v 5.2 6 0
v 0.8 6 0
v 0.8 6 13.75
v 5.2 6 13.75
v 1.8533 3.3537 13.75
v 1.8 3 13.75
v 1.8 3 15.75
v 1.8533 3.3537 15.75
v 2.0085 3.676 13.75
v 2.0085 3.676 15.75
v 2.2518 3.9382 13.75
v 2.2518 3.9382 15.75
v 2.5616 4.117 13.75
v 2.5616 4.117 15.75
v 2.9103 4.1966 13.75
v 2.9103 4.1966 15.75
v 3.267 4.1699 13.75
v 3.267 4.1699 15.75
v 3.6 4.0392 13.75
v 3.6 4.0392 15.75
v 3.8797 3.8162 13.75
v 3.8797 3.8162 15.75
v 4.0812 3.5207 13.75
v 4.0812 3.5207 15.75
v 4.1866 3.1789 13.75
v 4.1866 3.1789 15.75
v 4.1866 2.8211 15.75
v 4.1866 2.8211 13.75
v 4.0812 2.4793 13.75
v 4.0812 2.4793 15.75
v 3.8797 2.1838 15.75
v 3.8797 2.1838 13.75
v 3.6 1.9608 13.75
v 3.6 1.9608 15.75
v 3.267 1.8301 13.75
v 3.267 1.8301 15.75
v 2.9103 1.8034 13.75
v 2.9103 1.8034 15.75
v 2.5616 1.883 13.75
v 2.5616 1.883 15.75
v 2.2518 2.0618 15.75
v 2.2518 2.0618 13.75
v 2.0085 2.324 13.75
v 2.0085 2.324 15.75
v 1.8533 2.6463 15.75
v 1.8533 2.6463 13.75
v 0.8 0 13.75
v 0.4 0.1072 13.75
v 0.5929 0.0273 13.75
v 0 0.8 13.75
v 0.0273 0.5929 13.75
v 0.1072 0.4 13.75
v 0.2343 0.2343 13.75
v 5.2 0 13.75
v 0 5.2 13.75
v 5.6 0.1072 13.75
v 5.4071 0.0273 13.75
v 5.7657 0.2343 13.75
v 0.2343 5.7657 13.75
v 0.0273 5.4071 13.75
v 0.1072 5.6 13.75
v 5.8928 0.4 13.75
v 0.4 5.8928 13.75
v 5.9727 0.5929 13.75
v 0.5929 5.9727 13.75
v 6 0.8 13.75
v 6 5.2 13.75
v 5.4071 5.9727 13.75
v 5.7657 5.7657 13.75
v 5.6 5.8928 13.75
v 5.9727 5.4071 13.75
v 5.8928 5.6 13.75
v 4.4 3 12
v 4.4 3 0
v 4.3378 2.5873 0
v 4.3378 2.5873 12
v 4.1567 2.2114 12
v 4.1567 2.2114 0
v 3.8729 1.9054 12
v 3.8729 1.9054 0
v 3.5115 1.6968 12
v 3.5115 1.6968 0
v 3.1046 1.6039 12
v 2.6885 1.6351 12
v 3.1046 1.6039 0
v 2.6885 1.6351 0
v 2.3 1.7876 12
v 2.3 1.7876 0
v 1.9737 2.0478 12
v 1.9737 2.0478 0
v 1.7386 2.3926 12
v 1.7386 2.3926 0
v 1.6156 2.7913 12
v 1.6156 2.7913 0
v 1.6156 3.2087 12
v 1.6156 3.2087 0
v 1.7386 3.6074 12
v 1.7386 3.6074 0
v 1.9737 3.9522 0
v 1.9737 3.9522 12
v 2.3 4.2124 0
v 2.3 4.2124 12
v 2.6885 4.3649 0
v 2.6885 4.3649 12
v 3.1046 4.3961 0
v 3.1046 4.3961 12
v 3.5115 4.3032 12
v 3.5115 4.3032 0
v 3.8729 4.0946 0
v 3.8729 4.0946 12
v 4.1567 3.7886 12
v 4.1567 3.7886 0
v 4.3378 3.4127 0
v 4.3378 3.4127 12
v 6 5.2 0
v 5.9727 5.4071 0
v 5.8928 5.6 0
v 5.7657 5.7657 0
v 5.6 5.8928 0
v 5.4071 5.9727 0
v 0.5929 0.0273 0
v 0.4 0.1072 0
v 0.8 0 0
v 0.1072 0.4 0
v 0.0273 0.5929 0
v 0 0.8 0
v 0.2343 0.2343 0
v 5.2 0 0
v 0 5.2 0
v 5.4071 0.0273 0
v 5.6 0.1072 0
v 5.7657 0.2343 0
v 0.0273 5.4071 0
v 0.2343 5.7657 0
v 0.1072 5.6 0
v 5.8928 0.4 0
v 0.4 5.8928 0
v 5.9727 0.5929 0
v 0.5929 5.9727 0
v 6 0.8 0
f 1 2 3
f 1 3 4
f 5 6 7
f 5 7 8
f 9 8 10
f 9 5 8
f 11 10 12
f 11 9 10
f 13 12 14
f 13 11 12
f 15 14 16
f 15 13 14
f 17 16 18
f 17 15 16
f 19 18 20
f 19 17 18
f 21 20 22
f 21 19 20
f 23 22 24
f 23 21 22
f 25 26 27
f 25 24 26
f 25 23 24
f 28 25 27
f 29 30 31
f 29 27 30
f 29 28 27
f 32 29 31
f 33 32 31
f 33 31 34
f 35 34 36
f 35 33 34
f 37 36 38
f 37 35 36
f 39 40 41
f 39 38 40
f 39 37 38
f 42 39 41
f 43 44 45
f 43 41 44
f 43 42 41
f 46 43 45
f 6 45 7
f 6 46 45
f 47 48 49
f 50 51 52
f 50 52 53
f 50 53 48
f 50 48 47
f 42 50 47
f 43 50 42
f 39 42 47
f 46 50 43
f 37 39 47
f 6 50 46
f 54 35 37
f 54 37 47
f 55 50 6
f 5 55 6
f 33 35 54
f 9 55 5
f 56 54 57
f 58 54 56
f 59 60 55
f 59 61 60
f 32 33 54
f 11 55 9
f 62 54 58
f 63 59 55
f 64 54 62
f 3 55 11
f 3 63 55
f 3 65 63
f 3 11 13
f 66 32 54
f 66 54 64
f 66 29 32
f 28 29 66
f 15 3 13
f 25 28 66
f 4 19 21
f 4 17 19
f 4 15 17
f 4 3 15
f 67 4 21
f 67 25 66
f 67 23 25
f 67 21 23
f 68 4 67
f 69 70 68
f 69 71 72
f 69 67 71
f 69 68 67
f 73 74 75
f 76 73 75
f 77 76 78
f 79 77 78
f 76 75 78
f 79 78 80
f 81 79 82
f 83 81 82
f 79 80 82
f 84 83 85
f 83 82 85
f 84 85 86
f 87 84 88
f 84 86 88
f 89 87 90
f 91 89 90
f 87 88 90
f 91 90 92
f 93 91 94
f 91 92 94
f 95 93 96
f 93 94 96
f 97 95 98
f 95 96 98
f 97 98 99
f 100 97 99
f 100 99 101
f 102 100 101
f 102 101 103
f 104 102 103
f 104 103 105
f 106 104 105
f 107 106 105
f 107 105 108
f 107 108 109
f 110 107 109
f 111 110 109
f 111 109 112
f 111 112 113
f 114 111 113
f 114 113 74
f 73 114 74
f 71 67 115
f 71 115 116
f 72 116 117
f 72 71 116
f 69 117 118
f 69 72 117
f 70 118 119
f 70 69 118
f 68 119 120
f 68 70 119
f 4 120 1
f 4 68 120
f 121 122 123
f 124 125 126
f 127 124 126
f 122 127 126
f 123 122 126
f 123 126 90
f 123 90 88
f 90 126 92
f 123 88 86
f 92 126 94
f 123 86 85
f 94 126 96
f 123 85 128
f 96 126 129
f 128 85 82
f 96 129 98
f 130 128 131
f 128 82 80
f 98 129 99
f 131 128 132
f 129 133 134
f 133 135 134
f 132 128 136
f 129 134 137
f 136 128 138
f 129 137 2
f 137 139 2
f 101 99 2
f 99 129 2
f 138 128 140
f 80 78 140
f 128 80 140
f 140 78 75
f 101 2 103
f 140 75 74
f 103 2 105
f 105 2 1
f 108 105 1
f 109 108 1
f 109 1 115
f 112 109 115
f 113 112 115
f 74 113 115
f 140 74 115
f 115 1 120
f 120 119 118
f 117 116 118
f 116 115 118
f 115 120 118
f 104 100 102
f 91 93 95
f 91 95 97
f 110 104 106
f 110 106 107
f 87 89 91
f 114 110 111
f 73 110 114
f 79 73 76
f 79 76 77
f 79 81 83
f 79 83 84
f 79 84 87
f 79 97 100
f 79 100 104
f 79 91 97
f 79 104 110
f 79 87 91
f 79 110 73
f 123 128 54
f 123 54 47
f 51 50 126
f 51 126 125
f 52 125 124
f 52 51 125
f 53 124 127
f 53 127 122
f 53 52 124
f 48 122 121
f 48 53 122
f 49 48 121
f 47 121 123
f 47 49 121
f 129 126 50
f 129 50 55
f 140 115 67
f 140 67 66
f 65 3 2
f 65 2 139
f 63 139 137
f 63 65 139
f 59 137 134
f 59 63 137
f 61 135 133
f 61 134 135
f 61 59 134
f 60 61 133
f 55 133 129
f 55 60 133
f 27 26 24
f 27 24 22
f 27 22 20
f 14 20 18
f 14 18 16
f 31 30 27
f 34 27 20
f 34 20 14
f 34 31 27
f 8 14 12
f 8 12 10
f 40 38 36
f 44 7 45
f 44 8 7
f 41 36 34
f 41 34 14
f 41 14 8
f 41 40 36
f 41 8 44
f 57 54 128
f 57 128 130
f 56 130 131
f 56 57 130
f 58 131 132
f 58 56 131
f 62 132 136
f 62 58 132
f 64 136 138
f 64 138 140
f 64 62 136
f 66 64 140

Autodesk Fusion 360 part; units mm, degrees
sketch "Sketch1" plane through (0, 0, 0) normal (0, 0, 1) x (1, 0, 0)
  line L0 (0, 0) -> (0, 6)
  line L1 (0, 6) -> (6, 6)
  line L2 (6, 6) -> (6, 0)
  line L3 (6, 0) -> (0, 0)
  dimension "d1" = 6
  dimension "d2" = 6
extrude "Extrude1" add sketch "Sketch1" along normal blind 13.75
sketch "Sketch2" plane through (0, 0, 13.75) normal (0, 0, 1) x (-1, 0, 0)
  line L0 (-6, 0) -> (-6, -6)
  line L1 (-6, -6) -> (0, -6)
  line L2 (0, -6) -> (0, 0)
  line L3 (0, 0) -> (-6, 0)
  circle A0 centre (-3, -3) radius 1.2
  dimension "d6" = 2.4
extrude "Extrude2" add sketch "Sketch2" along normal blind 2 contours A0
sketch "Sketch3" plane through (0, 0, 0) normal (0, 0, -1) x (1, 0, 0)
  line L0 (6, -6) -> (6, 0)
  line L1 (6, 0) -> (0, 0)
  line L2 (0, 0) -> (0, -6)
  line L3 (0, -6) -> (6, -6)
  circle A0 centre (3, -3) radius 1.4
  dimension "d9" = 2.8
extrude "Extrude3" cut sketch "Sketch3" against normal blind 12 contours A0
fillet "Fillet1" radius 0.8 4 edges at (6, 0, 6.875) (6, 6, 6.875) (0, 6, 6.875) (0, 0, 6.875)
